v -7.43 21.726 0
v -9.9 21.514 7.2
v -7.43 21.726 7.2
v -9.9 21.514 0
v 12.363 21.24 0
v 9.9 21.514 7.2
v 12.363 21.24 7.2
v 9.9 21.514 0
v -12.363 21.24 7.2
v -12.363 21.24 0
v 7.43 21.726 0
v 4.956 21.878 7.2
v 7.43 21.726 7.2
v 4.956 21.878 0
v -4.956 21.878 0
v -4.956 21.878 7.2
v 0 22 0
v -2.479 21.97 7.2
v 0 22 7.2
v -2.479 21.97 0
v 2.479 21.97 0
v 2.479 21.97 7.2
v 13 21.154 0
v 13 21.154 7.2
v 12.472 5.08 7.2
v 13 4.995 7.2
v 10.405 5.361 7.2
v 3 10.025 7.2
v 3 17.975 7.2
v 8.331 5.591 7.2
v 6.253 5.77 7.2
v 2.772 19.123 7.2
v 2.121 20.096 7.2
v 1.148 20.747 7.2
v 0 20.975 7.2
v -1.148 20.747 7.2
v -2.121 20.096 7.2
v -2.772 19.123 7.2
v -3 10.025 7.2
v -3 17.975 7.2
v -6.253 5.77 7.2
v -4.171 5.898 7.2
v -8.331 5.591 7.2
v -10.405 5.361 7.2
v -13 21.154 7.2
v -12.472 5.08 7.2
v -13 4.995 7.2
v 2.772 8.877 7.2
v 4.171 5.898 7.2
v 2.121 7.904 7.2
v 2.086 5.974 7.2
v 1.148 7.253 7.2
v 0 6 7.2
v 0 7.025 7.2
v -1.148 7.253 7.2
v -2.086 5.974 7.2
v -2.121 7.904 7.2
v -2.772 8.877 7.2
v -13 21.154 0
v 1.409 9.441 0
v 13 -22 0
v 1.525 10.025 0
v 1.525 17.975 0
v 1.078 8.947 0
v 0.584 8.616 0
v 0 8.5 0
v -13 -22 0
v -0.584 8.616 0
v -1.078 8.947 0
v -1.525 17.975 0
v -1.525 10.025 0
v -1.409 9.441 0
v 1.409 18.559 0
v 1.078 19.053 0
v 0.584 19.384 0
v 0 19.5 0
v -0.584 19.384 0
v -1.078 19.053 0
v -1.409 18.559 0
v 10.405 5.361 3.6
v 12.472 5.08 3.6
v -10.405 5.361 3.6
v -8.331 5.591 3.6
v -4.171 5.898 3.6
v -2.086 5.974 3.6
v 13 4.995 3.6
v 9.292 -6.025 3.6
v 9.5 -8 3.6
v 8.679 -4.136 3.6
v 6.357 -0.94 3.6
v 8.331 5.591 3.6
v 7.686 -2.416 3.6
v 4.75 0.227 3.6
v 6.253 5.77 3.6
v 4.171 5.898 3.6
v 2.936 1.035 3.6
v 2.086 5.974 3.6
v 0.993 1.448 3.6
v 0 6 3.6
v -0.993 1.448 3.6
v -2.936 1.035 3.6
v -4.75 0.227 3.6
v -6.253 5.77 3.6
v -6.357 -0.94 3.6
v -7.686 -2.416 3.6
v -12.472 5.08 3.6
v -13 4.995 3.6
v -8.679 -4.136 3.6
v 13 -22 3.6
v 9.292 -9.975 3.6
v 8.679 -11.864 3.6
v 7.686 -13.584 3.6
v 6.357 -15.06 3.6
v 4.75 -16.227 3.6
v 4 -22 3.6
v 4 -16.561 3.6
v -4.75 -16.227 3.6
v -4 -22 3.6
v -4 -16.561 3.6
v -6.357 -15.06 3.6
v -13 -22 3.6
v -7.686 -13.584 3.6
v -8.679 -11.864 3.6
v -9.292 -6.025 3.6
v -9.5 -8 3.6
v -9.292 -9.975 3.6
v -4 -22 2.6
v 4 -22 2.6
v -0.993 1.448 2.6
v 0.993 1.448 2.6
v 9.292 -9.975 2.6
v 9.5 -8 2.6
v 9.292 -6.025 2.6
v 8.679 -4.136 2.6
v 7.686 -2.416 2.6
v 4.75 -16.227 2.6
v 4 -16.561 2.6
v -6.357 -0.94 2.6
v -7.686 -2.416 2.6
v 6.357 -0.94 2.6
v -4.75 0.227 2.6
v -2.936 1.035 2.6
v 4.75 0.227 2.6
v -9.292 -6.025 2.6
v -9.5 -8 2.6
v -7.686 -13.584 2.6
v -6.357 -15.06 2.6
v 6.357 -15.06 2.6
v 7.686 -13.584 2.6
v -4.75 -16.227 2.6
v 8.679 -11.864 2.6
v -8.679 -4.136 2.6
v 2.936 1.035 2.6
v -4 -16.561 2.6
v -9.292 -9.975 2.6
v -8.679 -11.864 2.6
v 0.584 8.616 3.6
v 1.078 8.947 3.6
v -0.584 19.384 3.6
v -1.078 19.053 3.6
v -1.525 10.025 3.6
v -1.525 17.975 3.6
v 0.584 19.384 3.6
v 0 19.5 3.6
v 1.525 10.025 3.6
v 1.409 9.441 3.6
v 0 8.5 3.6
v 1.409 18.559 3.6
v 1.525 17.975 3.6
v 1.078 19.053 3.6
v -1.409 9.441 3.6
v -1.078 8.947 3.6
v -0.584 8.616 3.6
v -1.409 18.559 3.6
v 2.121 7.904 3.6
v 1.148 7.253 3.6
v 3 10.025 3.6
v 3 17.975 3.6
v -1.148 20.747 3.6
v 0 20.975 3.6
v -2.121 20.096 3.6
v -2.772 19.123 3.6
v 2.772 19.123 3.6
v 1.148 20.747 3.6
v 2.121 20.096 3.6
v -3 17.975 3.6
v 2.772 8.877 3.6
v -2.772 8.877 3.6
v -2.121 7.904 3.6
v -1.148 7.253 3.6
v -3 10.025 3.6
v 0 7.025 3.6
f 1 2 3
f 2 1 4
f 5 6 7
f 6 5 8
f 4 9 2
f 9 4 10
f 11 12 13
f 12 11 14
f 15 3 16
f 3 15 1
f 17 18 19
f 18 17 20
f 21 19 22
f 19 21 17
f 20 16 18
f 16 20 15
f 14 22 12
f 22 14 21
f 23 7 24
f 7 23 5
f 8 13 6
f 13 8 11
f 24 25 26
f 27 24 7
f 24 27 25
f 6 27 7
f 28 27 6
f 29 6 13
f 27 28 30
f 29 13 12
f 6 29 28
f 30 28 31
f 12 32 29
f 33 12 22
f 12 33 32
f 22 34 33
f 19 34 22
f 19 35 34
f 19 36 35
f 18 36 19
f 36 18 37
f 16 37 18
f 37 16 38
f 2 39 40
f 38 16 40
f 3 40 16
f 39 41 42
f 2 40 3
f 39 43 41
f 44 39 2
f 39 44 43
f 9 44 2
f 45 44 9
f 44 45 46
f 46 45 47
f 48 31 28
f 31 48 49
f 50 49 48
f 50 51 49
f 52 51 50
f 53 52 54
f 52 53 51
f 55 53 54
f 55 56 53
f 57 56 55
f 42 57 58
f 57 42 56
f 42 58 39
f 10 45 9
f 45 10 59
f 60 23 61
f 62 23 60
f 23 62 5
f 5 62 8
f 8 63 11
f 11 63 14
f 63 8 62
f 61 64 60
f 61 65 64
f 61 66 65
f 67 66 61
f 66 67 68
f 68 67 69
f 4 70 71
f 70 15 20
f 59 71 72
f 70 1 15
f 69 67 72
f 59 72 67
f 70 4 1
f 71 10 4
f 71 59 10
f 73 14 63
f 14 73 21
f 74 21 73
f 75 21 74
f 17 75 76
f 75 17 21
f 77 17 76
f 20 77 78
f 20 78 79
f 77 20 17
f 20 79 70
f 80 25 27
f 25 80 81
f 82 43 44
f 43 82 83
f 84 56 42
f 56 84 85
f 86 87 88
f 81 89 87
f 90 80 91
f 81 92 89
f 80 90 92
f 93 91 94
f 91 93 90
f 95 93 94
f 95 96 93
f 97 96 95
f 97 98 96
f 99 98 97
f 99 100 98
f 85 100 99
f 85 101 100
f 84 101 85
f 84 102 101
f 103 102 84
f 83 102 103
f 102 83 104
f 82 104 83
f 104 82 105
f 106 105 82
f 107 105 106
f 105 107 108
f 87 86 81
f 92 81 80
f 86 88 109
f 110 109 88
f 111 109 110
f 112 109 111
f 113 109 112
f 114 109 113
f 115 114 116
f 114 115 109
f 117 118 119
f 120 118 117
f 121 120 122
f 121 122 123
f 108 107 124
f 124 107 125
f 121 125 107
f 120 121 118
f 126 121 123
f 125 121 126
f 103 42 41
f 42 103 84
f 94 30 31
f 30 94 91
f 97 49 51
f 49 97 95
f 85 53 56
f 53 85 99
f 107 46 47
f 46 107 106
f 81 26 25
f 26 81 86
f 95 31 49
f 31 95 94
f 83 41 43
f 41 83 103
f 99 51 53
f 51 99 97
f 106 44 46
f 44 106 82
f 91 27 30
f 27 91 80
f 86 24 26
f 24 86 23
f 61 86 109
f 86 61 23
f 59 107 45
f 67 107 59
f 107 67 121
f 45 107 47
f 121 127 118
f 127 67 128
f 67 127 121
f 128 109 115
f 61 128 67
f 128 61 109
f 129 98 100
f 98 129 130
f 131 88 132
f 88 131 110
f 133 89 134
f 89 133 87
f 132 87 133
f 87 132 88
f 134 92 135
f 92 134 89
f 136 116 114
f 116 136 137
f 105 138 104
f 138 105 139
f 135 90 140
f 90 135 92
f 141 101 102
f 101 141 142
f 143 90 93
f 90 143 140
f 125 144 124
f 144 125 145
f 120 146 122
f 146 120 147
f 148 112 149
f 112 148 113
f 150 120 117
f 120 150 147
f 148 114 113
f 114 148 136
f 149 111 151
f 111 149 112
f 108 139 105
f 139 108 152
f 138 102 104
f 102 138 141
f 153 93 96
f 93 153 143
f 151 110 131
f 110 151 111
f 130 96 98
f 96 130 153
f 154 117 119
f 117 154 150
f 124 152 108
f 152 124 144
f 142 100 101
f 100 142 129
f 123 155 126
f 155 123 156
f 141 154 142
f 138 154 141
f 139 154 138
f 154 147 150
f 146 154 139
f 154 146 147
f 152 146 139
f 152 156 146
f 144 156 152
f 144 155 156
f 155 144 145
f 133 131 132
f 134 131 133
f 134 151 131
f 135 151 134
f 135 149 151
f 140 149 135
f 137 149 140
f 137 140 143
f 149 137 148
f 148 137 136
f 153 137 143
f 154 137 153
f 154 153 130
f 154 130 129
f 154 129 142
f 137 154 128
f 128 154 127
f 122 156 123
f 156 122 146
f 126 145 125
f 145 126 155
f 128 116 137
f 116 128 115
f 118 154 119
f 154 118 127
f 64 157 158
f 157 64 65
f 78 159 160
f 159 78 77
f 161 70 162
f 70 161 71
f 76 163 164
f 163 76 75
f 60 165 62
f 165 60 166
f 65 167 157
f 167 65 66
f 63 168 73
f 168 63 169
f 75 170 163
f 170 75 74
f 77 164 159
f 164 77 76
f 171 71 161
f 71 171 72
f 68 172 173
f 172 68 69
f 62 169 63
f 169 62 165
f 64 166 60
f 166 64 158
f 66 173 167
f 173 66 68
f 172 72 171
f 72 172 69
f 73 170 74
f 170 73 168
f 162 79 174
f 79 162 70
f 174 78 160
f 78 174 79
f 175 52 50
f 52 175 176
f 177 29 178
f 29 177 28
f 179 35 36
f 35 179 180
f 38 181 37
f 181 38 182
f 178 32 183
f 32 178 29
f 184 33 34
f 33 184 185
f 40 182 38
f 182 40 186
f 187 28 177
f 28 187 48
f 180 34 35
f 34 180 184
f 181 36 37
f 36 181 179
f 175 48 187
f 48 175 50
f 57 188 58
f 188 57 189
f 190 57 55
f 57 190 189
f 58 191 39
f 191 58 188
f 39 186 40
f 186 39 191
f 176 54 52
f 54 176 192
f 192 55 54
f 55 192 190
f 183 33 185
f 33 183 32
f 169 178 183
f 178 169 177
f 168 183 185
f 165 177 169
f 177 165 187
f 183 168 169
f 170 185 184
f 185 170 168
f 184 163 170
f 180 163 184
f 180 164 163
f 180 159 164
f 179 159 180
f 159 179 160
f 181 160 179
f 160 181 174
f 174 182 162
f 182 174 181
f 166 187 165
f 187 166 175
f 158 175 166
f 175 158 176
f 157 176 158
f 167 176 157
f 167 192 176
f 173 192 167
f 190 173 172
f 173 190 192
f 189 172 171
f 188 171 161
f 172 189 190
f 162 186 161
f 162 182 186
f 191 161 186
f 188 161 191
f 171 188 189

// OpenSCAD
// file: configuration.scad
// Increase this if your slicer or printer make holes too tight.
extra_radius = 0.1;
extra_extrusion_width = 0.5;

// OD = outside diameter, corner to corner.
m3_nut_od = 6.1;
m3_nut_radius = m3_nut_od/2 + 0.35 + extra_radius;
m3_washer_radius = 3.5 + extra_radius;

// Major diameter of metric 3mm thread.
m3_major = 2.85;
m3_radius = m3_major/2 + extra_radius;
m3_wide_radius = m3_major/2 + extra_radius;

// NEMA17 stepper motors.
motor_shaft_diameter = 5;
motor_shaft_radius = motor_shaft_diameter/2 + extra_radius;

// Frame brackets. M3x8mm screws work best with 3.6 mm brackets.
thickness = 3.6;

// OpenBeam or Misumi. Currently only 15x15 mm, but there is a plan
// to make models more parametric and allow 20x20 mm in the future.
extrusion = 15;

// Placement for the NEMA17 stepper motors.
motor_offset = 44;
motor_length = 47;
// main file
include <configuration.scad>;

tab_length = 44;
tab_width = 26;
tab_thickness = 3.6;
glass_thickness = 3.6; 
glass_radius = 85.0;
guard_thickness = 16;

fsr_radius = 9.5;
fsr_recess = 1.0;
fsr_connector_width = 8.0;

m3_head_radius = 3.0;
ridge_length = 11;


//The basic glass tab
module glass_tab_base(){
	intersection(){
		difference(){
			cylinder(r=glass_radius+guard_thickness, h=glass_thickness+tab_thickness, $fn=256);
			translate([0, 0, tab_thickness])
				cylinder(r=glass_radius, h=10, center=false, $fn=256);
		}
		translate([-tab_width/2,(glass_radius+guard_thickness)-tab_length,0])
			cube([tab_width, (glass_radius+guard_thickness), glass_thickness+tab_thickness]);
	}
}


//..with added FSR recess
module glass_tab_recess(){
	difference(){
		glass_tab_base();
		translate([0,(glass_radius+guard_thickness)-((tab_length+guard_thickness)/2),tab_thickness-fsr_recess])
			cylinder(r=fsr_radius, h=10);
		translate([-fsr_connector_width/2,0,tab_thickness-fsr_recess])
			cube([fsr_connector_width,(glass_radius+guard_thickness)-((tab_length+guard_thickness)/2),10]);
	}
}


//..and mounting hole
module glass_tab(){
	translate([0,-(glass_radius+guard_thickness)+(tab_length/2),0]){
		difference(){
			glass_tab_recess();
			hull(){
				translate([0,glass_radius+(guard_thickness/2)-(ridge_length/2)+m3_wide_radius,-1])
					cylinder(r=m3_wide_radius, h = 20, $fn=16);
				translate([0,glass_radius+(guard_thickness/2)+(ridge_length/2)-m3_wide_radius,-1])
					cylinder(r=m3_wide_radius, h = 20, $fn=16);
			}
			hull(){
				translate([0,glass_radius+(guard_thickness/2)-(ridge_length/2)+m3_wide_radius,tab_thickness])
					cylinder(r=m3_head_radius, h = 20, $fn=16);
				translate([0,glass_radius+(guard_thickness/2)+(ridge_length/2)-m3_wide_radius,tab_thickness])
					cylinder(r=m3_head_radius, h = 20, $fn=16);
			}
		}
	}
}

glass_tab();
